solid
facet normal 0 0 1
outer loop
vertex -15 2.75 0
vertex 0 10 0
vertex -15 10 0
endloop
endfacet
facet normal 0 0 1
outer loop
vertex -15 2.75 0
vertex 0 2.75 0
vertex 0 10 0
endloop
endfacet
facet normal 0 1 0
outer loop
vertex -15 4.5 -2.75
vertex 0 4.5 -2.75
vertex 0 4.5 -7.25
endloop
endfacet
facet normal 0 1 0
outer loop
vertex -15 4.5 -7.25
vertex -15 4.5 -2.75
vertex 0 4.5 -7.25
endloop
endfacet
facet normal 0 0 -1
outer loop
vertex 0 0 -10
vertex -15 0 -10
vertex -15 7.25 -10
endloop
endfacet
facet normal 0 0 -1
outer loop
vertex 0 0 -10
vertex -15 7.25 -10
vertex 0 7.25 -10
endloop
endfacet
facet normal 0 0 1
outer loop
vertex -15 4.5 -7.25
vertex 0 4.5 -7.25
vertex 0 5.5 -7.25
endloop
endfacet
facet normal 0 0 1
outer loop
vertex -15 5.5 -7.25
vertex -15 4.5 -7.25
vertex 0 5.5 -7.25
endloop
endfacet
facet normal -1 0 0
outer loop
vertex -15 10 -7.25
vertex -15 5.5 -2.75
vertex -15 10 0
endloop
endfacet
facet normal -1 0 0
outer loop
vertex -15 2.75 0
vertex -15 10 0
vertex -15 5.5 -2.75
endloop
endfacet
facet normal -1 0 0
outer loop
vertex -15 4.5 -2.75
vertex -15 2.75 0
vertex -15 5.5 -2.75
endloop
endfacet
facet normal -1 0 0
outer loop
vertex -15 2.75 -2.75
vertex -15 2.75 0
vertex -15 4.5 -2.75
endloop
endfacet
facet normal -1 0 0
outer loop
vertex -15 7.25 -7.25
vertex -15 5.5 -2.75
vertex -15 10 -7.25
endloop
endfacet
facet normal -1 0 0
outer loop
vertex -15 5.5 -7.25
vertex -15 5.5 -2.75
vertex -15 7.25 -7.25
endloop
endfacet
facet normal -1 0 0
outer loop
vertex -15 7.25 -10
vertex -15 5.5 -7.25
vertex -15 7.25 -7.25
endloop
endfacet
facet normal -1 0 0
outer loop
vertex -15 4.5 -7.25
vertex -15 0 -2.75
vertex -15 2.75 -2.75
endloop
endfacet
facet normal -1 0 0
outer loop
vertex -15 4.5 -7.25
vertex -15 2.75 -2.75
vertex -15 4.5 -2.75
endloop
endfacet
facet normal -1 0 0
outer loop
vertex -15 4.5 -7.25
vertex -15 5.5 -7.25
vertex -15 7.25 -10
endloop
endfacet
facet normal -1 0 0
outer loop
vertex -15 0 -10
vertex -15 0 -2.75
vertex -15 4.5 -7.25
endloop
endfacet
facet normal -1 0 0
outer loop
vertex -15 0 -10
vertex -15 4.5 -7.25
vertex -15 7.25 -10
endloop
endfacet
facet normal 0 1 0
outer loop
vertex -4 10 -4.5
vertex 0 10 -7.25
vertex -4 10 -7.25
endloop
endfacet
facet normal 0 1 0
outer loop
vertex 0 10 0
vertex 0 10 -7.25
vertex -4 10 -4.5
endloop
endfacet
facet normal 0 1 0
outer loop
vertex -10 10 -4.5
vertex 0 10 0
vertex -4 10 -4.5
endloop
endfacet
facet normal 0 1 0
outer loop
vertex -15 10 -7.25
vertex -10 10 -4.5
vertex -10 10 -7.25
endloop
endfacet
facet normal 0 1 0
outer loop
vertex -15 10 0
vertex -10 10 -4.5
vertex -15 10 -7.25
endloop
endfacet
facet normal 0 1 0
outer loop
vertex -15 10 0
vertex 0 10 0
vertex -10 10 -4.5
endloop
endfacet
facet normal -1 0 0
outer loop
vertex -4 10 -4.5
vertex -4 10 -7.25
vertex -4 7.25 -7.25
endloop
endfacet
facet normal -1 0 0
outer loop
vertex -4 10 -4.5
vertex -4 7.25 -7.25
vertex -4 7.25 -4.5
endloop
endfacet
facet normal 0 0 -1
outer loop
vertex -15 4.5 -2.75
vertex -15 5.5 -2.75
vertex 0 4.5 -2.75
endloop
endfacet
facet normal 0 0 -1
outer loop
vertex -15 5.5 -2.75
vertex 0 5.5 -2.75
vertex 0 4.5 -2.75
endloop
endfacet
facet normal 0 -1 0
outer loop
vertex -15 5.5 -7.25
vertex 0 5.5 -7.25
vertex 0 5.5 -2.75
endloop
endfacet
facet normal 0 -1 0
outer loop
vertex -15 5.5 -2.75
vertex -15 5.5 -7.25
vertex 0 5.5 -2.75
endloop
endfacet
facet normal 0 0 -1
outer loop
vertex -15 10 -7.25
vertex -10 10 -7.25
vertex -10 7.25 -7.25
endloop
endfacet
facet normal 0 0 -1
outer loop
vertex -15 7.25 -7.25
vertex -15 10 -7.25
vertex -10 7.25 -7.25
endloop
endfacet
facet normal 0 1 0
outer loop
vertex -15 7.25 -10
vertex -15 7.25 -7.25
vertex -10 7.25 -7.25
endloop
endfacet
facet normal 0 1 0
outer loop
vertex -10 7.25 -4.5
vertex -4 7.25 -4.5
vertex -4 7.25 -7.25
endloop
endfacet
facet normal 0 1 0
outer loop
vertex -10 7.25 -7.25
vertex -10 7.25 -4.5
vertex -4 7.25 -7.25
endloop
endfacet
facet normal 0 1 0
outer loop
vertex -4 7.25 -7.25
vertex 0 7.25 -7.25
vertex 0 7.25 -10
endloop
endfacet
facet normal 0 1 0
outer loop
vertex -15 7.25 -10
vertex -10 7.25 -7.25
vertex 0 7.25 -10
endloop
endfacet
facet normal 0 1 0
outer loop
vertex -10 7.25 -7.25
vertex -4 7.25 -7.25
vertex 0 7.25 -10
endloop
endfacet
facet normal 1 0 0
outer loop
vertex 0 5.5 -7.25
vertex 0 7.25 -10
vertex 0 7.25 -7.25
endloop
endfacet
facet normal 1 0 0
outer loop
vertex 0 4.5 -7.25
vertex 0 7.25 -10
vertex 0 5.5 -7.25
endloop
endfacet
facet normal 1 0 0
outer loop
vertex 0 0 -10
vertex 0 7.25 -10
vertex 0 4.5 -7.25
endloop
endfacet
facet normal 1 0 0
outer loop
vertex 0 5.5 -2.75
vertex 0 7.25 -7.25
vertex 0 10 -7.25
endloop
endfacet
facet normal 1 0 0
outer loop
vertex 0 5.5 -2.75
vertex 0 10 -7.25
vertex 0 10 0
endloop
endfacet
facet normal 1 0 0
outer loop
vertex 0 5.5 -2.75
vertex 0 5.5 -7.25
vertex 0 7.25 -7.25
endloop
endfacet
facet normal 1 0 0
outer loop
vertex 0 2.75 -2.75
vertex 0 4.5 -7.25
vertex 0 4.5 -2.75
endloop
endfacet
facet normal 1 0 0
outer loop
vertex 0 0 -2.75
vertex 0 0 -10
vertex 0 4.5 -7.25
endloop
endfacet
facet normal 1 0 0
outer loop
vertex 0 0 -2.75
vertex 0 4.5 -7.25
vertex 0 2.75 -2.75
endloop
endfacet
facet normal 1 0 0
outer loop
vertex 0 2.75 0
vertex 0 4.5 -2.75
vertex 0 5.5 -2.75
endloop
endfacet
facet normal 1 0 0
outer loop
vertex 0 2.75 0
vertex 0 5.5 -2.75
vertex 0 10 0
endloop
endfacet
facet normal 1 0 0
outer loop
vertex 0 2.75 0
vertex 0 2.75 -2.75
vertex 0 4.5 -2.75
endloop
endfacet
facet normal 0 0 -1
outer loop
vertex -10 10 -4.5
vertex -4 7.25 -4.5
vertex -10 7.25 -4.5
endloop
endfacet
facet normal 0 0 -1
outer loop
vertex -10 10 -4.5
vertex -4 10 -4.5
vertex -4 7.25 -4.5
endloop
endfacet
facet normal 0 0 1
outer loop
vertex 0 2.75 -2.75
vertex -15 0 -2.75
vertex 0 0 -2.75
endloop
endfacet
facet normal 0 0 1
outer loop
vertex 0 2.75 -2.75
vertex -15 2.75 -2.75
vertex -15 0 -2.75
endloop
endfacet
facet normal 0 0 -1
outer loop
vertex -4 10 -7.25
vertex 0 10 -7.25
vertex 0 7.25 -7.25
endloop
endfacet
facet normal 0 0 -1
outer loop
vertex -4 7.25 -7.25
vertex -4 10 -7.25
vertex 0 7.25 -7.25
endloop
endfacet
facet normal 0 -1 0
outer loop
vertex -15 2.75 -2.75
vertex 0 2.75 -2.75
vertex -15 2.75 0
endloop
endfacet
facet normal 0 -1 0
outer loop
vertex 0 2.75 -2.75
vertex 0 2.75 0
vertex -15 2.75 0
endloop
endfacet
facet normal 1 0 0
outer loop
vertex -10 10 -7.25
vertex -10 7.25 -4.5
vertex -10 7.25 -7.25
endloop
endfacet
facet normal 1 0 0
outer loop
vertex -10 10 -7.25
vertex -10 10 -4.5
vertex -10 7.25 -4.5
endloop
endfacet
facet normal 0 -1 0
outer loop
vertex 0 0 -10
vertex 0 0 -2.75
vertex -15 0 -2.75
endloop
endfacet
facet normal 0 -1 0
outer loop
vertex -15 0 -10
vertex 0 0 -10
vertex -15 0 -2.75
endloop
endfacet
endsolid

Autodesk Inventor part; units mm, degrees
ref_plane "YZ Plane" through (0, 0, 0) normal (1, 0, 0) x (0, 1, 0)
ref_plane "XZ Plane" through (0, 0, 0) normal (0, 1, 0) x (-1, 0, 0)
ref_plane "XY Plane" through (0, 0, 0) normal (0, 0, 1) x (1, 0, 0)
sketch "Sketch1" plane through (0, 0, 0) normal (0, 1, 0) x (-1, 0, 0)
  line L0 (0, 0) -> (15, 0)
  line L1 (15, 0) -> (15, -10)
  line L2 (15, -10) -> (0, -10)
  line L3 (0, -10) -> (0, 0)
  dimension "d0" = 15
  dimension "d1" = 10
extrude "Extrusion1" add sketch "Sketch1" along normal blind 10
sketch "Sketch2" plane through (-15, 0, 0) normal (0, 0, 1) x (1, 0, 0)
  line L0 (15, 0) -> (0, 0) projected
  line L1 (15, 0) -> (15, 10) projected
  line L2 (0, 0) -> (15, 0)
  line L3 (15, 0) -> (15, 2.75)
  line L4 (15, 2.75) -> (0, 2.75)
  line L5 (0, 2.75) -> (0, 0)
  dimension "d4" = 2.75
extrude "Extrusion2" cut sketch "Sketch2" against normal blind 2.75
sketch "Sketch3" plane through (0, 0, -10) normal (1, 0, 0) x (0, 0, -1)
  line L0 (0, 10) -> (-2.75, 10)
  line L1 (-2.75, 10) -> (-2.75, 7.25)
  line L2 (-2.75, 7.25) -> (0, 7.25)
  line L3 (0, 7.25) -> (0, 10)
  point P0 (-10, 0)
  dimension "d7" = 2.75
  dimension "d8" = 2.75
extrude "Extrusion3" cut sketch "Sketch3" against normal blind 15
sketch "Sketch4" plane through (0, 10, 0) normal (0, 1, 0) x (1, 0, 0)
  line L0 (0, 7.25) -> (-15, 7.25) projected
  line L1 (-10, 7.25) -> (-4, 7.25)
  line L2 (-4, 7.25) -> (-4, 4.5)
  line L3 (-4, 4.5) -> (-10, 4.5)
  line L4 (-10, 4.5) -> (-10, 7.25)
  dimension "d11" = 6
  dimension "d12" = 2.75
extrude "Extrusion4" cut sketch "Sketch4" against normal blind 2.75
sketch "Sketch5" plane through (0, 0, -2.75) normal (1, 0, 0) x (0, 0, -1)
  line L0 (0, 4.5) -> (4.5, 4.5)
  line L1 (4.5, 4.5) -> (4.5, 5.5)
  line L2 (4.5, 5.5) -> (0, 5.5)
  line L3 (0, 5.5) -> (0, 4.5)
  point P0 (-2.75, 0)
  dimension "d15" = 1
extrude "Extrusion5" cut sketch "Sketch5" against normal blind 15
properties part number "148"
